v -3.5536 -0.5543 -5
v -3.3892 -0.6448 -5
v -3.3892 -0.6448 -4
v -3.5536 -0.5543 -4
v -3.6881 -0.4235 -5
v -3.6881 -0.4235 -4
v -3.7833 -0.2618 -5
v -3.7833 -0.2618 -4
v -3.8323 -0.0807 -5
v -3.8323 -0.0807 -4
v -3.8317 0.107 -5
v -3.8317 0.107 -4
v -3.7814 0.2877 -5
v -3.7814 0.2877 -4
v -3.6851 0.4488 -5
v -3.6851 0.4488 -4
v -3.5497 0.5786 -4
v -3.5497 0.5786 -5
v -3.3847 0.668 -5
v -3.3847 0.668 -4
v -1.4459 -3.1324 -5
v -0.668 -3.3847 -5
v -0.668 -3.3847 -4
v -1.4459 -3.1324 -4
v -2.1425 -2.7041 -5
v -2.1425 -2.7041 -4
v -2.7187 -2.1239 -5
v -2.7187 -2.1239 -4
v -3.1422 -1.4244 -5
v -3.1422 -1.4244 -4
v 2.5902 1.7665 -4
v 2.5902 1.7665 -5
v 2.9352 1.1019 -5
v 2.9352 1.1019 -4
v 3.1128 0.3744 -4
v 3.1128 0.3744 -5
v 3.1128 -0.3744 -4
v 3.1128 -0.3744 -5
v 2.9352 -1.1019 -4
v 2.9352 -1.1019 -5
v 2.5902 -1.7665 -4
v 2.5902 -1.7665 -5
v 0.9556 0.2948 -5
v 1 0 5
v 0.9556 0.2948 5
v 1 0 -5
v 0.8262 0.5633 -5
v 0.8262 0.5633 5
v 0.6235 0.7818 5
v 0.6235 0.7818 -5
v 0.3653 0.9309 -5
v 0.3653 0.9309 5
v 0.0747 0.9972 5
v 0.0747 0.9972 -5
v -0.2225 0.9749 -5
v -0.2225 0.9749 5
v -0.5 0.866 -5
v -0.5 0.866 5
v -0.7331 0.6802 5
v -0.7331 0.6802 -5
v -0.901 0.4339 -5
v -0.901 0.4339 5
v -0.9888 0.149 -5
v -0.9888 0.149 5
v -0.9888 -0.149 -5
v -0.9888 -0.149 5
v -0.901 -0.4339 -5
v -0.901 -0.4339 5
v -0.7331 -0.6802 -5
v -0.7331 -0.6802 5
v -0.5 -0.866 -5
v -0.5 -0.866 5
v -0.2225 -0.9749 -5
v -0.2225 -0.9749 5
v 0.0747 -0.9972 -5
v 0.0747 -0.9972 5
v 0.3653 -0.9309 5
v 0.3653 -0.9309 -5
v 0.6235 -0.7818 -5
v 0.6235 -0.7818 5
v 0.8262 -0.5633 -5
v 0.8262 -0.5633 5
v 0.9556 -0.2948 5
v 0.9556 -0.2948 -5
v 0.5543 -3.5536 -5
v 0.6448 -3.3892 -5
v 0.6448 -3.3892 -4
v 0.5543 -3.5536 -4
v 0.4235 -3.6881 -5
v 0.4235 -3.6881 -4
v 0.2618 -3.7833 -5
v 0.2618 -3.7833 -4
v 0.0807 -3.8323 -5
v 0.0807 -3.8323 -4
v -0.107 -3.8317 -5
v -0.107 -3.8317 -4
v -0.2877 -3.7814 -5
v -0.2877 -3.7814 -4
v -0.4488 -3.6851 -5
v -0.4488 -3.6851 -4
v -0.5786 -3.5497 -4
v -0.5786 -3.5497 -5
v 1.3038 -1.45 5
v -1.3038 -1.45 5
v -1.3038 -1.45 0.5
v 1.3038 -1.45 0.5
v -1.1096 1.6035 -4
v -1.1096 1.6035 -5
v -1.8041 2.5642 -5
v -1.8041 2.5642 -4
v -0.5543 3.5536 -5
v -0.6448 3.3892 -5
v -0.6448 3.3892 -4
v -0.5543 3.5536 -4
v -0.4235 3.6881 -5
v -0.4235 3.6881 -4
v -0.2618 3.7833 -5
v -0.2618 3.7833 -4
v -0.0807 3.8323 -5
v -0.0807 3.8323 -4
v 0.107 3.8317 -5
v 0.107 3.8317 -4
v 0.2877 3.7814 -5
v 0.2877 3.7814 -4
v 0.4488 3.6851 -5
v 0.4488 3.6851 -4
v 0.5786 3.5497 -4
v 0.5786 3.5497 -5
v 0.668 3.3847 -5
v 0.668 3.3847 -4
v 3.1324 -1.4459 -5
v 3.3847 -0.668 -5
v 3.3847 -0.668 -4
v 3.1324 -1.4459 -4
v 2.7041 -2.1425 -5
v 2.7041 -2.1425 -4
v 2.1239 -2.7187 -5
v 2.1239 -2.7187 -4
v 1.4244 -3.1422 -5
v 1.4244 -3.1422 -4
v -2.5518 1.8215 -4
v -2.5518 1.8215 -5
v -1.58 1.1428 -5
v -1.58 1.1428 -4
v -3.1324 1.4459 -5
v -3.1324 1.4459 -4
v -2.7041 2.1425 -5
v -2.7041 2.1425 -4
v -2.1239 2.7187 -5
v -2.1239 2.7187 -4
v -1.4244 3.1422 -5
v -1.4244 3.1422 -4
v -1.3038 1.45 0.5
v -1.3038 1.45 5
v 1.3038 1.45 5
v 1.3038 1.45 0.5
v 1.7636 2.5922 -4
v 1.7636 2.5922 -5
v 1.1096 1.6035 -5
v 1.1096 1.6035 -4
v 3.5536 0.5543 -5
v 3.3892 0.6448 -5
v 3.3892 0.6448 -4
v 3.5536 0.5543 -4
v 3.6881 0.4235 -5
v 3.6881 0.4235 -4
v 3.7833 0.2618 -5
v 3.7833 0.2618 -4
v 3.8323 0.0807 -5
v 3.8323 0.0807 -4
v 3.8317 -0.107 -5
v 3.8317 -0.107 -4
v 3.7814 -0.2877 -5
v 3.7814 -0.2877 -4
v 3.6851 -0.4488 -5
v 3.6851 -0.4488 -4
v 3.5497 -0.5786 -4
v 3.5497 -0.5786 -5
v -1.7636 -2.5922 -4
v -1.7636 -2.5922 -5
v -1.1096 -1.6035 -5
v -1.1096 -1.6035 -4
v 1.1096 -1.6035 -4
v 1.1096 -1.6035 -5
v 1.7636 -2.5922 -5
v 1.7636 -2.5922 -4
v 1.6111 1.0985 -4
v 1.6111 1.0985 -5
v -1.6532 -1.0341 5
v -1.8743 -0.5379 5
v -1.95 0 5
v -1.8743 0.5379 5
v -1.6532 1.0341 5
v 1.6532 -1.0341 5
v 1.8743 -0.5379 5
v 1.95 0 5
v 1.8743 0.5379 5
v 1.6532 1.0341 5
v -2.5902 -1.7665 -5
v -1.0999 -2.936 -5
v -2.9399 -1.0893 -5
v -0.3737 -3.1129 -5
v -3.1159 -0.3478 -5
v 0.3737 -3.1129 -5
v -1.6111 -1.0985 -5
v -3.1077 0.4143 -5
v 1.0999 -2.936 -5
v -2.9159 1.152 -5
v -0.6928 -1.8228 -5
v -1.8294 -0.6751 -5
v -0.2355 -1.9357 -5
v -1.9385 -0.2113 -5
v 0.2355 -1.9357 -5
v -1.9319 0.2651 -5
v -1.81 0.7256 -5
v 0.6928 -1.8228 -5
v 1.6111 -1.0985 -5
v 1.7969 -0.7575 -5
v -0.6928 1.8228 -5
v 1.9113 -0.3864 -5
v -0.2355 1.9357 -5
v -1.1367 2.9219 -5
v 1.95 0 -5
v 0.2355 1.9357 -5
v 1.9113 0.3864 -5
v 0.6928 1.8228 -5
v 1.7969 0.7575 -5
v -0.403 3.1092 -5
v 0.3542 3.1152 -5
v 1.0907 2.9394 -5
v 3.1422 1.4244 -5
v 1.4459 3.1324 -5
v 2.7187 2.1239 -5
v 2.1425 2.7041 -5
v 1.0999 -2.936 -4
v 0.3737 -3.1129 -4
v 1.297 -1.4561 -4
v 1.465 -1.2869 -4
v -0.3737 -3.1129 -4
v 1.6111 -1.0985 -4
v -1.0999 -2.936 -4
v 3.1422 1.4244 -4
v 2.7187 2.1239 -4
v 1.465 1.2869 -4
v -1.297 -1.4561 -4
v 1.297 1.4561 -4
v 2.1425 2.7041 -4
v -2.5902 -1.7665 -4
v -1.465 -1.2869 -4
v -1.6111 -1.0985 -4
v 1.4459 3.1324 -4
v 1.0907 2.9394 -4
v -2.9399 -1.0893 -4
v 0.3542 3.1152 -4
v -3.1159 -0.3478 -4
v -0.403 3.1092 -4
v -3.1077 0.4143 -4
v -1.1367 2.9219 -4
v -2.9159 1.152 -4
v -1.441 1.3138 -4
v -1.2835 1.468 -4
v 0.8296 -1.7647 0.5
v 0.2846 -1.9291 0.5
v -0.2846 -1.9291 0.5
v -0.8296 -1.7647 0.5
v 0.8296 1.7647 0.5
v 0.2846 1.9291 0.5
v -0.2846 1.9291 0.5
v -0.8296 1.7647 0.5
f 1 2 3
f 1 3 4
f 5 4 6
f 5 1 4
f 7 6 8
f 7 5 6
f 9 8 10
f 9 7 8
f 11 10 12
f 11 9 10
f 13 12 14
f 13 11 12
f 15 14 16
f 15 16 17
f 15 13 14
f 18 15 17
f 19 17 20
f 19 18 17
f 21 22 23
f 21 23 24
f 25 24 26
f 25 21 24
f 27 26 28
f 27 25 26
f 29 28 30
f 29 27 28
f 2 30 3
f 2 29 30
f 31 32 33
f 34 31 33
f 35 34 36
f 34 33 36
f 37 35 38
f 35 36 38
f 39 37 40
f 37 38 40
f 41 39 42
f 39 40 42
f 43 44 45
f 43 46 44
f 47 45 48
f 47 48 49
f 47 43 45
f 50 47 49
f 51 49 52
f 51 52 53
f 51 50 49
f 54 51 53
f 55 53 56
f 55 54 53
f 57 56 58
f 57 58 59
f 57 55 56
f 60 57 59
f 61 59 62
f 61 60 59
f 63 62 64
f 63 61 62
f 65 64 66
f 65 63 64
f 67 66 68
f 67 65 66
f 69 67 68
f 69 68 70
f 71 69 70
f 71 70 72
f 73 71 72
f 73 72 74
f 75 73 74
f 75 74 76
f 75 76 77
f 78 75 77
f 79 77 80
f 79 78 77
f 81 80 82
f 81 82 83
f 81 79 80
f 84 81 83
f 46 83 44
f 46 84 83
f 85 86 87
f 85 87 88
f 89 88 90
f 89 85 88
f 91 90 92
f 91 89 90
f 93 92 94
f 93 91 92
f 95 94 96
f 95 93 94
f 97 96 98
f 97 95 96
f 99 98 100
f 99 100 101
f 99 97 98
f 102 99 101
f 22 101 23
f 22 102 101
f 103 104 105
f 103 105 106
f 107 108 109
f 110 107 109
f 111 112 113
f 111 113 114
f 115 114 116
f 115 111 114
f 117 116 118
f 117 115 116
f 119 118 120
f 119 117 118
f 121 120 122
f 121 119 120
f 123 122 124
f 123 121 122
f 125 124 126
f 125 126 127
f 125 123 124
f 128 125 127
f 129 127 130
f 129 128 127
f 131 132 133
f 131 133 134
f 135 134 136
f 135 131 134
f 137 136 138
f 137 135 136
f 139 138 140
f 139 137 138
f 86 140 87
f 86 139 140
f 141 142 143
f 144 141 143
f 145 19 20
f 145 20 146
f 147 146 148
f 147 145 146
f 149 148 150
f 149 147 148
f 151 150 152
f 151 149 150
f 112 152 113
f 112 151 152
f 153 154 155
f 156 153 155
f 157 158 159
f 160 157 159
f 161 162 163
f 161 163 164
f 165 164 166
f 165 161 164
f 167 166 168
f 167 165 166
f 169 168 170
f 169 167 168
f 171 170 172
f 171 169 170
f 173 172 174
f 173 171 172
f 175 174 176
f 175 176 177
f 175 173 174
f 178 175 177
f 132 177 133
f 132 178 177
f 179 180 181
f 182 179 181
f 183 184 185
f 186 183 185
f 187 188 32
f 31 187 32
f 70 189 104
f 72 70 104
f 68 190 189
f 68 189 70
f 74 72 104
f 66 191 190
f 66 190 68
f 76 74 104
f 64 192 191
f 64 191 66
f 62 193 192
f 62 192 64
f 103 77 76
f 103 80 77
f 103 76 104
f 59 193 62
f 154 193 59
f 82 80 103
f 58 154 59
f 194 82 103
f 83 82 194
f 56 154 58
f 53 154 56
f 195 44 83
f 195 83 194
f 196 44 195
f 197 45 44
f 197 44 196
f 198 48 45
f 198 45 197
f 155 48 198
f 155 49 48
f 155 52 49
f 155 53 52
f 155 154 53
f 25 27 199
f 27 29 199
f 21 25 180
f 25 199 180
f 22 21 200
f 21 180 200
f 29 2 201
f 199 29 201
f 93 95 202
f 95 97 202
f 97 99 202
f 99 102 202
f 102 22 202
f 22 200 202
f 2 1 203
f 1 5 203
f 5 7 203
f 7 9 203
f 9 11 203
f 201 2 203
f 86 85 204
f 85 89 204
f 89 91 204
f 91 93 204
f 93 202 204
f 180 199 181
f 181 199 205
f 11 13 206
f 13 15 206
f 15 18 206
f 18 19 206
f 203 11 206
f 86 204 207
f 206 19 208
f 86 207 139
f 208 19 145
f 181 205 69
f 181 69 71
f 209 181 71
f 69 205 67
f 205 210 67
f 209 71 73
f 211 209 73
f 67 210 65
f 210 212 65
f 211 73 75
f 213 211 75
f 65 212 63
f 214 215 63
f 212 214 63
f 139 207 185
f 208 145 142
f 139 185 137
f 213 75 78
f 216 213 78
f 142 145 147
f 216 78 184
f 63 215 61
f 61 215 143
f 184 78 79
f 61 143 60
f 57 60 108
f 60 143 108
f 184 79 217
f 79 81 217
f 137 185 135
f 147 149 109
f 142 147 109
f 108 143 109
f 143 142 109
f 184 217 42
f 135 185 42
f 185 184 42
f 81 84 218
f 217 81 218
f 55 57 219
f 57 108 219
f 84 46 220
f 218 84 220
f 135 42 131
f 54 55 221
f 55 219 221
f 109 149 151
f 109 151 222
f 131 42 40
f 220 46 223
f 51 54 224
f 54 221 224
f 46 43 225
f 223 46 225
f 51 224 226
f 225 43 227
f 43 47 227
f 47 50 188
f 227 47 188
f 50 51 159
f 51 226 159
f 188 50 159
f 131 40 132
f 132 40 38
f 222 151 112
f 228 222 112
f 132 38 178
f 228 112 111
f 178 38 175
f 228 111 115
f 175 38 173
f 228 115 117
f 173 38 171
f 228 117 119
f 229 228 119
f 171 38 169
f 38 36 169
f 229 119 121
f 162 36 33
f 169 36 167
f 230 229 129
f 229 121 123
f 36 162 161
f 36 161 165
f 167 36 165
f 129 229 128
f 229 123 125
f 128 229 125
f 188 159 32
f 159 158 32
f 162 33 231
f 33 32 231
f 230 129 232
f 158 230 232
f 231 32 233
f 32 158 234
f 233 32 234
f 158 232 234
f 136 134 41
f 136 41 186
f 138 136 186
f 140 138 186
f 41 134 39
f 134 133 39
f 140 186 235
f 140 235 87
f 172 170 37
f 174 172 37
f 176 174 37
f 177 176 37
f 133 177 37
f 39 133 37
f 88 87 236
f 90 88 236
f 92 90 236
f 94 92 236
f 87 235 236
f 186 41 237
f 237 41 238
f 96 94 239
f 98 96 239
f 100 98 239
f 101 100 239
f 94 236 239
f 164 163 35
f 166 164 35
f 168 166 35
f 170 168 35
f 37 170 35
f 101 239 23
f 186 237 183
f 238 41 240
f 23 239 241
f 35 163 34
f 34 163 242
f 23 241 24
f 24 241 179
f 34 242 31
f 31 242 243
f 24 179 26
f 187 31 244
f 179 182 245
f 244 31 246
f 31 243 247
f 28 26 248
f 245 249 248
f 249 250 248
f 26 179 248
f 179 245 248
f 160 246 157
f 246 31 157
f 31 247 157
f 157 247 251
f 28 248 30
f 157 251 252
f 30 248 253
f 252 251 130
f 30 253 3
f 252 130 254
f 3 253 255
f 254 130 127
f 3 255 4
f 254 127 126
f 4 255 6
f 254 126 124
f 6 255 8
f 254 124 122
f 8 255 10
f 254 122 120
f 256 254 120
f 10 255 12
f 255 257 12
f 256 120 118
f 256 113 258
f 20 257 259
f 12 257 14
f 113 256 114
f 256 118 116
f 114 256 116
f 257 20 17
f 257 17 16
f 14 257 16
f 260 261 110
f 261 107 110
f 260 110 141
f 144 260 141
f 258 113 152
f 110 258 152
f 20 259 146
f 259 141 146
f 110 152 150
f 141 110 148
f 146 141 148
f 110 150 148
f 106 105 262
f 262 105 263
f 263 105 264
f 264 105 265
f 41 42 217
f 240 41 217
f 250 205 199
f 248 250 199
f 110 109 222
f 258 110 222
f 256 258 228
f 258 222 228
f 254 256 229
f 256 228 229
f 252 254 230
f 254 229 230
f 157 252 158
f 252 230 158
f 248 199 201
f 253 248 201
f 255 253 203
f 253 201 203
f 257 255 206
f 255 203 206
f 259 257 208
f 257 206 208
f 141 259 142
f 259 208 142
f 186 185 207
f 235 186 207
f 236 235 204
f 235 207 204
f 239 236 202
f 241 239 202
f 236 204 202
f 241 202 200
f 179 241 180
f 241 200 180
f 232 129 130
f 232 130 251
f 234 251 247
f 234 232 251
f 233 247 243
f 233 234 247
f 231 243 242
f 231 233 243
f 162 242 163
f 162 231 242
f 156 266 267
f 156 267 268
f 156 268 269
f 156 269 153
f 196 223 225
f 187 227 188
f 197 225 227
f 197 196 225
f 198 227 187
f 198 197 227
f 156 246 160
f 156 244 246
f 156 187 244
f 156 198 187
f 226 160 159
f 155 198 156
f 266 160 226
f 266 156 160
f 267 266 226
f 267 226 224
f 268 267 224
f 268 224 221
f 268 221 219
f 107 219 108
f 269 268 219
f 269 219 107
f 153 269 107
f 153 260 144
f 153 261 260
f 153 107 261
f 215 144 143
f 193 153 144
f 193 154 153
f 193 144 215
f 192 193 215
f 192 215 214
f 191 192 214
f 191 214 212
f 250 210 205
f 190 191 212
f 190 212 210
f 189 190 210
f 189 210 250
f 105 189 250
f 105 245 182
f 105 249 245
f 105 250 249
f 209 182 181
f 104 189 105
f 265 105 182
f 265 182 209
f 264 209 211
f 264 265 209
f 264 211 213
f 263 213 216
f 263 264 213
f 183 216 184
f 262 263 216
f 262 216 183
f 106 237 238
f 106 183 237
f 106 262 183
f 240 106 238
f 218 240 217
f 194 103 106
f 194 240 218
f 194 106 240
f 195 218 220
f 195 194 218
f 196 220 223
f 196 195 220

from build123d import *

# Parameters (mm, degrees)
SKETCH_1_R          = 1.95
SKETCH_1_R_2        = 1
EXTRUDE_1_DEPTH     = 5
EXTRUDE_3_DEPTH     = 1
SKETCH_5_W          = 3.686325021
SKETCH_5_H          = 0.905885224
SKETCH_5_W_2        = 4.457672836
SKETCH_5_H_2        = 1.506818987
CUT_EXTRUDE_4_DEPTH = 4.5


with BuildPart() as part:
    # 草图1 → 凸台-拉伸1 (new body, symmetric)
    with BuildSketch(Plane.XY):
        Circle(SKETCH_1_R)
        Circle(SKETCH_1_R_2, mode=Mode.SUBTRACT)
    extrude(amount=EXTRUDE_1_DEPTH, both=True)

    # 草图3 → 凸台-拉伸3 (add)
    with BuildSketch(Plane(origin=(0, 0, -5), x_dir=(-1, 0, 0), z_dir=(0, 0, -1))):
        with BuildLine():
            ThreePointArc((-0.668047872, 3.384702652), (-2.447870462, 2.431137635), (-3.389205192, 0.644816382))
            ThreePointArc((-3.389205192, 0.644816382), (-3.838268125, -0.013163552), (-3.384702652, -0.668047872))
            ThreePointArc((-3.384702652, -0.668047872), (-2.431137635, -2.447870462), (-0.644816382, -3.389205192))
            ThreePointArc((-0.644816382, -3.389205192), (0.013163552, -3.838268125), (0.668047872, -3.384702652))
            ThreePointArc((0.668047872, -3.384702652), (2.447870462, -2.431137635), (3.389205192, -0.644816382))
            ThreePointArc((3.389205192, -0.644816382), (3.838268125, 0.013163552), (3.384702652, 0.668047872))
            ThreePointArc((3.384702652, 0.668047872), (2.431137635, 2.447870462), (0.644816382, 3.389205192))
            ThreePointArc((0.644816382, 3.389205192), (-0.013163552, 3.838268125), (-0.668047872, 3.384702652))
        make_face()
        with BuildLine():
            Line((2.551831088, 1.821511161), (1.580005505, 1.142839711))
            ThreePointArc((1.580005505, 1.142839711), (1.364402664, 1.393163799), (1.109636091, 1.603498596))
            Line((1.109636091, 1.603498596), (1.804122226, 2.564154403))
            ThreePointArc((1.804122226, 2.564154403), (0.024621795, 3.135145702), (-1.763627121, 2.592173641))
            Line((-1.763627121, 2.592173641), (-1.109636091, 1.603498596))
            ThreePointArc((-1.109636091, 1.603498596), (-1.383616658, 1.374083311), (-1.611132184, 1.098523138))
            Line((-1.611132184, 1.098523138), (-2.590192379, 1.766535663))
            ThreePointArc((-2.590192379, 1.766535663), (-3.135242384, 0), (-2.590192379, -1.766535663))
            Line((-2.590192379, -1.766535663), (-1.611132184, -1.098523138))
            ThreePointArc((-1.611132184, -1.098523138), (-1.383616658, -1.374083311), (-1.109636091, -1.603498596))
            Line((-1.109636091, -1.603498596), (-1.763627121, -2.592173641))
            ThreePointArc((-1.763627121, -2.592173641), (0, -3.135242384), (1.763627121, -2.592173641))
            Line((1.763627121, -2.592173641), (1.109636091, -1.603498596))
            ThreePointArc((1.109636091, -1.603498596), (1.383616658, -1.374083311), (1.611132184, -1.098523138))
            Line((1.611132184, -1.098523138), (2.590192379, -1.766535663))
            ThreePointArc((2.590192379, -1.766535663), (3.135063211, 0.033518256), (2.551831088, 1.821511161))
        make_face(mode=Mode.SUBTRACT)
    extrude(amount=-EXTRUDE_3_DEPTH)

    # 草图5 → 切除-拉伸4 (cut)
    with BuildSketch(Plane.XY.offset(5)):
        with Locations((-0.148639524, 1.902942612)):
            Rectangle(SKETCH_5_W, SKETCH_5_H)
        with Locations((0.156311938, -2.203409494)):
            Rectangle(SKETCH_5_W_2, SKETCH_5_H_2)
    extrude(amount=-CUT_EXTRUDE_4_DEPTH, mode=Mode.SUBTRACT)


solid = part.part
